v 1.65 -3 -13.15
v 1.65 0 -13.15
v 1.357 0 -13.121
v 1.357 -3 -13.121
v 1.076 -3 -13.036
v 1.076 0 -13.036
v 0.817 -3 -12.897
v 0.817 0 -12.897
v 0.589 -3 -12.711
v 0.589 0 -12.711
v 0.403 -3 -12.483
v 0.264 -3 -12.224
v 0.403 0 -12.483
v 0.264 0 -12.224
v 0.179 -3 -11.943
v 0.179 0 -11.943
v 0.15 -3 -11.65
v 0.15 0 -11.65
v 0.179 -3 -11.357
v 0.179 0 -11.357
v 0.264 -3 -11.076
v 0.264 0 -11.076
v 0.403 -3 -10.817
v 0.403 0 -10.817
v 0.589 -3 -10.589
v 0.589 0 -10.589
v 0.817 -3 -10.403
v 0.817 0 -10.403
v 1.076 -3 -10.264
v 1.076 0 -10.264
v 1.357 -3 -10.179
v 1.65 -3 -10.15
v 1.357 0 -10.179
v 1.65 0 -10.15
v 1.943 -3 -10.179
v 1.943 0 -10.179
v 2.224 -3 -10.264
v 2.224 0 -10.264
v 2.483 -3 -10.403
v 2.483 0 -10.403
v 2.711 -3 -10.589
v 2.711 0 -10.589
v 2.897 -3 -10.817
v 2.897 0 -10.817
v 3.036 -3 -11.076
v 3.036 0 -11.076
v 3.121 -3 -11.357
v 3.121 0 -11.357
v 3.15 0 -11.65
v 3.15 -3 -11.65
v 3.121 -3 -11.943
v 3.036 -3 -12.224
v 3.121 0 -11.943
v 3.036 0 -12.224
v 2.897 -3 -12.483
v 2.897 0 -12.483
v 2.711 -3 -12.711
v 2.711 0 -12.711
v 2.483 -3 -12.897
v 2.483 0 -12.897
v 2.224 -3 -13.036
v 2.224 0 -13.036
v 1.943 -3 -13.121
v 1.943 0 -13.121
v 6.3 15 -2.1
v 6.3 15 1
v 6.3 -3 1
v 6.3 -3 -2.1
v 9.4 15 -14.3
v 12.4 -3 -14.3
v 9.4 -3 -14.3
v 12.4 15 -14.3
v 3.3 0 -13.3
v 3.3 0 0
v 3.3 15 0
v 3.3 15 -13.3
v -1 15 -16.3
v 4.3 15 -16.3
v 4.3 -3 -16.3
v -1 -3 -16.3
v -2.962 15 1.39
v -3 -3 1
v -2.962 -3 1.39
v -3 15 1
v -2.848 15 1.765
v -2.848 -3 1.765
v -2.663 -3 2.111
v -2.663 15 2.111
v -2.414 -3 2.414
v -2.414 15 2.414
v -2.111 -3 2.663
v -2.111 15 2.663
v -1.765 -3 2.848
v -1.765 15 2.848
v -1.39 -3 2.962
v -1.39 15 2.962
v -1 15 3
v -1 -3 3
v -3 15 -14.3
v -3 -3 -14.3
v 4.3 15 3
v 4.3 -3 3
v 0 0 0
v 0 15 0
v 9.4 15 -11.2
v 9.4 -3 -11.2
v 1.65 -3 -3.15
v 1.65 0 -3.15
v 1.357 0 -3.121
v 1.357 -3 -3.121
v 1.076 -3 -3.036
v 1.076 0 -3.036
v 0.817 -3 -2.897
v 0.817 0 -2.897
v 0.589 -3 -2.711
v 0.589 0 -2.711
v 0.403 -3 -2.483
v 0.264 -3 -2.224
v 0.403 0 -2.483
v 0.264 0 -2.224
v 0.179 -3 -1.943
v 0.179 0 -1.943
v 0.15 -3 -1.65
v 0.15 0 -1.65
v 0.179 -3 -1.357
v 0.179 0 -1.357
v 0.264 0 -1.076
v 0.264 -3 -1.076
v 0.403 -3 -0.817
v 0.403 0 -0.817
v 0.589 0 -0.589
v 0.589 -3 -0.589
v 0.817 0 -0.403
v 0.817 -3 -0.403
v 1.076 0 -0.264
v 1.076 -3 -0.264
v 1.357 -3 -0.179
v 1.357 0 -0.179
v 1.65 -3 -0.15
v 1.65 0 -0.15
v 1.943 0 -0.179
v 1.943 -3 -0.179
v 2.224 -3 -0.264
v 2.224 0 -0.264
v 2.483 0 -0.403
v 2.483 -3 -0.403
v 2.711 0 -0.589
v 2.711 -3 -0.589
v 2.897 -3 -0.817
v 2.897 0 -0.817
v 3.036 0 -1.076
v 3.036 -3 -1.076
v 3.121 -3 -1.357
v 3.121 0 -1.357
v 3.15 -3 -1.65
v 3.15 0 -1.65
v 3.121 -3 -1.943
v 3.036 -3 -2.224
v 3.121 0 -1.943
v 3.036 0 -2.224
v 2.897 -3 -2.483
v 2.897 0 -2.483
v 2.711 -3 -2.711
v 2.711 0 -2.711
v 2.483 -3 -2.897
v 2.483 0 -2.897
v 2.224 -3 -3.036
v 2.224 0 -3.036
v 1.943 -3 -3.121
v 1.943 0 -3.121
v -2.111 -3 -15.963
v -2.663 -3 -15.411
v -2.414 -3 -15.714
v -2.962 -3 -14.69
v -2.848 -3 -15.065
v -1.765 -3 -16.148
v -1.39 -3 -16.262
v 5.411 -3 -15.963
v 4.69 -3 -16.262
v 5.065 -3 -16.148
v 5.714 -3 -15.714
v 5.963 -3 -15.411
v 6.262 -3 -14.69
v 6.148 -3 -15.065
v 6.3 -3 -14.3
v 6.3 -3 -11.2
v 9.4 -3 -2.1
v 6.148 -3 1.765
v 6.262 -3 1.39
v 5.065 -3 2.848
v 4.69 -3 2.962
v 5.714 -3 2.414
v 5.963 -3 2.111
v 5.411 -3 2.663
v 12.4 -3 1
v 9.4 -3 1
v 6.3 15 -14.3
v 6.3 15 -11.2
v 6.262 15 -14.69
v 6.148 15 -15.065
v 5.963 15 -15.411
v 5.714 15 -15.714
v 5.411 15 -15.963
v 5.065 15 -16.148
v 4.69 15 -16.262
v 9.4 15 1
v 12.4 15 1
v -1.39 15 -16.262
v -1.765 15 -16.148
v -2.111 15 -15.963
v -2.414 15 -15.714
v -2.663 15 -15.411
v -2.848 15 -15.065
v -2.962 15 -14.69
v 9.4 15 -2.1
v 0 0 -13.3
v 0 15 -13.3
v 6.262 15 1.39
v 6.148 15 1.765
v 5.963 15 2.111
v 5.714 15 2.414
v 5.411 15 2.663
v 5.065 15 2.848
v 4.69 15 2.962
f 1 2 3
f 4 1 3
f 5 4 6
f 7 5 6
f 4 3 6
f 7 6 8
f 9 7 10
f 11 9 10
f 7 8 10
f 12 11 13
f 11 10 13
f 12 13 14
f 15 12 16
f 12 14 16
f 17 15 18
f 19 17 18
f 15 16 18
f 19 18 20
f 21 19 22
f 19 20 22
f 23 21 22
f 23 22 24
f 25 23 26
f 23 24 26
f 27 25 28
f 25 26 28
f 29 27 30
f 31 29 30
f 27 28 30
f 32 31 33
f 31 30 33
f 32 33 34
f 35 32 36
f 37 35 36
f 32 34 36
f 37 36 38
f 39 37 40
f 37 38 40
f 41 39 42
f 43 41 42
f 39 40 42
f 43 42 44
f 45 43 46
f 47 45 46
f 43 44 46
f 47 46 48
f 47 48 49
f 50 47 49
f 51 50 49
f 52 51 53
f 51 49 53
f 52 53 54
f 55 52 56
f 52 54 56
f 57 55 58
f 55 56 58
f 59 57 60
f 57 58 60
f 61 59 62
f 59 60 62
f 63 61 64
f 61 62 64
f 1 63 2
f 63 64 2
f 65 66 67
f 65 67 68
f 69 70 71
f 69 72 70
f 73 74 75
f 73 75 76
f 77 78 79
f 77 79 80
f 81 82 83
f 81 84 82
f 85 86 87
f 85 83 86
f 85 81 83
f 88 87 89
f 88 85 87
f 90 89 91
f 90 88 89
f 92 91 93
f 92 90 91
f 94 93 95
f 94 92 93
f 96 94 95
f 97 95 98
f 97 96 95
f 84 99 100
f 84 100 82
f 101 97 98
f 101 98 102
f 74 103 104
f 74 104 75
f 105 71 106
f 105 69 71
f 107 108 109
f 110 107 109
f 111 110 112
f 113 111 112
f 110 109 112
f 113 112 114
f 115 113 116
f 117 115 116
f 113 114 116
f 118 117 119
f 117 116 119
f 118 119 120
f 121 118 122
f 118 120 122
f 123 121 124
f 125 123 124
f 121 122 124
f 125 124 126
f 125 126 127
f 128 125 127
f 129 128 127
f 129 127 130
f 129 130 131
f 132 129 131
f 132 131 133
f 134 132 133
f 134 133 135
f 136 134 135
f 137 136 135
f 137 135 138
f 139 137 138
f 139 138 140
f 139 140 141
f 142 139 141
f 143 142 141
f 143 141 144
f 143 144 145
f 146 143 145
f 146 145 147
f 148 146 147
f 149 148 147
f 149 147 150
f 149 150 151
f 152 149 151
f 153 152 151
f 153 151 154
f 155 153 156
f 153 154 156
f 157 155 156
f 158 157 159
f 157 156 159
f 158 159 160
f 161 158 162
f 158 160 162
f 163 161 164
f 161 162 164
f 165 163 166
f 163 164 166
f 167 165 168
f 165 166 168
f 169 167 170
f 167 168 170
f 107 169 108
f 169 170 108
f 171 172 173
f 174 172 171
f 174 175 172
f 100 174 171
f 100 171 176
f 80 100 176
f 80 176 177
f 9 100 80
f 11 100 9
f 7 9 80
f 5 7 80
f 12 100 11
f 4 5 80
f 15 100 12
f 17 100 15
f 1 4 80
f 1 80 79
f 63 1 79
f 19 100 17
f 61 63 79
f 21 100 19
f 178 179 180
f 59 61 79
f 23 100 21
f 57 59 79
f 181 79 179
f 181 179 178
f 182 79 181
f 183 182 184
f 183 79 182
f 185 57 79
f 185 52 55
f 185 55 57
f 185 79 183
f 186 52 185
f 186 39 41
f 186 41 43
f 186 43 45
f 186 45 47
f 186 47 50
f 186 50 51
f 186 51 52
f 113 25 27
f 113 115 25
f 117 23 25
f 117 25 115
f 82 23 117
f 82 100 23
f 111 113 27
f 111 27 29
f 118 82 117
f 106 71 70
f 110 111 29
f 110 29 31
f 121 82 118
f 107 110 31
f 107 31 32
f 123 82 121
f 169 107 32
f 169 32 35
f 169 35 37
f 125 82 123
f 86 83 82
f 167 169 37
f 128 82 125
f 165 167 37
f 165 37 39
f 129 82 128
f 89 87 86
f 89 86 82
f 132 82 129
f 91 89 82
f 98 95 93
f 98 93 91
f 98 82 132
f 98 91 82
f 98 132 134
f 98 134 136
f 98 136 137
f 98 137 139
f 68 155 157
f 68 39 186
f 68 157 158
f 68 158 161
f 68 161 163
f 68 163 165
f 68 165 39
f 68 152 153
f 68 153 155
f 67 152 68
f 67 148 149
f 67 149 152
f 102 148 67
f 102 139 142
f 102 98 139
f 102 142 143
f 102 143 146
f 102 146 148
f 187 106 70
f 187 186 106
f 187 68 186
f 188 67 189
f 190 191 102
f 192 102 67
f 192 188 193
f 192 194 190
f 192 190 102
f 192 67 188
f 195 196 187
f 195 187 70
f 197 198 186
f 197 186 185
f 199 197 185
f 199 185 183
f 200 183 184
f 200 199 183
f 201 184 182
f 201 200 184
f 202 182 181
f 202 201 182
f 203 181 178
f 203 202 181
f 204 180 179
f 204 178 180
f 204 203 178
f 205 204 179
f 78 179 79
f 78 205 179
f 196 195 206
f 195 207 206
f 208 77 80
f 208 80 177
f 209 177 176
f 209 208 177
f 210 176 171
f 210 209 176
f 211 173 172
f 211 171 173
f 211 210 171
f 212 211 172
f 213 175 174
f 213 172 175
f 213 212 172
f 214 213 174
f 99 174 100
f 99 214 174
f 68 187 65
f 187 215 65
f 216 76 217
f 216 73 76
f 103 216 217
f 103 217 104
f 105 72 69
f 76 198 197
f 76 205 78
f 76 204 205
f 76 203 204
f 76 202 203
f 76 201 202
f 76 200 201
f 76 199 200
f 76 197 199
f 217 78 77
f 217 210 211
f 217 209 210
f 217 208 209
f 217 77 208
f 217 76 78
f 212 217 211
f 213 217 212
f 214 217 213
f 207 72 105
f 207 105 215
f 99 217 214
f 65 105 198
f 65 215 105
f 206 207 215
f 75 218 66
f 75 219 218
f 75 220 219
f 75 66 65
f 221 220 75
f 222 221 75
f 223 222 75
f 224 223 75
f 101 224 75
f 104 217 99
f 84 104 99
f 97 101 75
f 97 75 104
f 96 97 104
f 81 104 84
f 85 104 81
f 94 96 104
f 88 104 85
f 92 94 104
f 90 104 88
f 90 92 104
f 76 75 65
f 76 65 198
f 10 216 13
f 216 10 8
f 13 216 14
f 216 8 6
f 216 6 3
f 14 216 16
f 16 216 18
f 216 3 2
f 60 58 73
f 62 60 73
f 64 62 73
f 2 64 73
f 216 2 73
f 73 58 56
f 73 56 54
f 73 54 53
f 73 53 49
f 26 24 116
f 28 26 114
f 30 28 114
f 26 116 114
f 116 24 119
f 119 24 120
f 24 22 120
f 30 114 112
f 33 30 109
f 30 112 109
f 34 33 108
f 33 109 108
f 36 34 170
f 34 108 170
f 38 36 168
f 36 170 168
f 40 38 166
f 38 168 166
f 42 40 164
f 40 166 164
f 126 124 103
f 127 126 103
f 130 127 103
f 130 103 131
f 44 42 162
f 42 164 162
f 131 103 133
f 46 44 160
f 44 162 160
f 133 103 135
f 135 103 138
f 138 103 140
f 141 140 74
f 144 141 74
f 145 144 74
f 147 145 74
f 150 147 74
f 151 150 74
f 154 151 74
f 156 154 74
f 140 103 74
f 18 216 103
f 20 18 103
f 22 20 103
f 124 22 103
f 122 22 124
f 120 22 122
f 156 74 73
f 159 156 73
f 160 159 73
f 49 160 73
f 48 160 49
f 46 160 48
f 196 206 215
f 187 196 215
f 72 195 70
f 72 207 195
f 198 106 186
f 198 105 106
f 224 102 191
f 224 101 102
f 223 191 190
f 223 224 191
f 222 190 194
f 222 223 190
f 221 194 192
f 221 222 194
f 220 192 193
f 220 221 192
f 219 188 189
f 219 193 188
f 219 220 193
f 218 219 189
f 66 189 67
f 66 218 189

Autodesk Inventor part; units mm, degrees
ref_plane "YZ Plane" through (0, 0, 0) normal (1, 0, 0) x (0, 1, 0)
ref_plane "XZ Plane" through (0, 0, 0) normal (0, 1, 0) x (-1, 0, 0)
ref_plane "XY Plane" through (0, 0, 0) normal (0, 0, 1) x (1, 0, 0)
sketch "Boceto1" plane through (0, 0, 0) normal (0, 1, 0) x (-1, 0, 0)
  line L0 (0, 0) -> (-3.3, 0)
  line L1 (-3.3, 0) -> (-3.3, -13.3)
  line L2 (-3.3, -13.3) -> (0, -13.3)
  line L3 (0, -13.3) -> (0, 0)
  line L4 (3, 3) -> (-6.3, 3)
  line L5 (-6.3, 3) -> (-6.3, -16.3)
  line L6 (-6.3, -16.3) -> (3, -16.3)
  line L7 (3, -16.3) -> (3, 3)
  dimension "d0" = 3.3
  dimension "d1" = 13.3
  dimension "d2" = 3
extrude "Extrusión1" add sketch "Boceto1" along normal blind 15
fillet "Empalme1" radius 2 4 edges at (6.3, 7.5, 3) (-3, 7.5, 3) (-3, 7.5, -16.3) (6.3, 7.5, -16.3)
sketch "Boceto2" plane through (0, 0, 0) normal (0, -1, 0) x (1, 0, 0)
  line L0 (6.3, 1) -> (6.3, -14.3) projected
  arc A0 (6.3, 1) -> (4.3, 3) centre (4.3, 1) ccw projected
  line L1 (-1, 3) -> (4.3, 3) projected
  arc A1 (-1, 3) -> (-3, 1) centre (-1, 1) ccw projected
  line L2 (-3, -14.3) -> (-3, 1) projected
  arc A2 (-3, -14.3) -> (-1, -16.3) centre (-1, -14.3) ccw projected
  line L3 (4.3, -16.3) -> (-1, -16.3) projected
  arc A3 (4.3, -16.3) -> (6.3, -14.3) centre (4.3, -14.3) ccw projected
  point P0 (0, 0)
extrude "Extrusión2" add sketch "Boceto2" along normal blind 3
sketch "Boceto3" plane through (0, 15, 0) normal (0, 1, 0) x (1, 0, 0)
  line L0 (3.3, 13.3) -> (3.3, 0) projected
  line L1 (6.3, -1) -> (6.3, 14.3) projected
  line L2 (12.4, -1) -> (12.4, 14.3)
  line L3 (12.4, -1) -> (9.4, -1)
  line L4 (12.4, -1) -> (15.4, -1) construction
  line L5 (9.4, -1) -> (9.4, 2.1)
  line L6 (9.4, 2.1) -> (6.3, 2.1)
  line L7 (12.4, 14.3) -> (9.4, 14.3)
  line L8 (9.4, 14.3) -> (9.4, 11.2)
  line L9 (9.4, 11.2) -> (6.3, 11.2)
  point P0 (0, 0)
  dimension "d8" = 6.1
  dimension "d9" = 3
  dimension "d10" = 180
  dimension "d11" = 3.1
  dimension "d12" = 3.1
extrude "Extrusión3" add sketch "Boceto3" against normal up to surface (18 mm away)
sketch "Boceto4" plane through (0, -3, 0) normal (0, -1, 0) x (1, 0, 0)
  line L0 (3.3, -13.3) -> (3.3, 0) projected
  line L1 (3.3, 0) -> (0, 0) projected
  line L2 (0, 0) -> (0, -13.3) projected
  line L3 (0, -13.3) -> (3.3, -13.3) projected
  point P0 (1.65, -1.65)
  point P1 (1.65, -11.65)
  point P2 (1.65, -13.3)
  dimension "d15" = 1.65
  dimension "d16" = 1.65
  dimension "d17" = 1.65
hole "Agujero1" at (1.65, -3, -1.65) at (1.65, -3, -11.65) direction (0, 1, 0) diameter 3 end through all
properties part number "cajaIMU"
